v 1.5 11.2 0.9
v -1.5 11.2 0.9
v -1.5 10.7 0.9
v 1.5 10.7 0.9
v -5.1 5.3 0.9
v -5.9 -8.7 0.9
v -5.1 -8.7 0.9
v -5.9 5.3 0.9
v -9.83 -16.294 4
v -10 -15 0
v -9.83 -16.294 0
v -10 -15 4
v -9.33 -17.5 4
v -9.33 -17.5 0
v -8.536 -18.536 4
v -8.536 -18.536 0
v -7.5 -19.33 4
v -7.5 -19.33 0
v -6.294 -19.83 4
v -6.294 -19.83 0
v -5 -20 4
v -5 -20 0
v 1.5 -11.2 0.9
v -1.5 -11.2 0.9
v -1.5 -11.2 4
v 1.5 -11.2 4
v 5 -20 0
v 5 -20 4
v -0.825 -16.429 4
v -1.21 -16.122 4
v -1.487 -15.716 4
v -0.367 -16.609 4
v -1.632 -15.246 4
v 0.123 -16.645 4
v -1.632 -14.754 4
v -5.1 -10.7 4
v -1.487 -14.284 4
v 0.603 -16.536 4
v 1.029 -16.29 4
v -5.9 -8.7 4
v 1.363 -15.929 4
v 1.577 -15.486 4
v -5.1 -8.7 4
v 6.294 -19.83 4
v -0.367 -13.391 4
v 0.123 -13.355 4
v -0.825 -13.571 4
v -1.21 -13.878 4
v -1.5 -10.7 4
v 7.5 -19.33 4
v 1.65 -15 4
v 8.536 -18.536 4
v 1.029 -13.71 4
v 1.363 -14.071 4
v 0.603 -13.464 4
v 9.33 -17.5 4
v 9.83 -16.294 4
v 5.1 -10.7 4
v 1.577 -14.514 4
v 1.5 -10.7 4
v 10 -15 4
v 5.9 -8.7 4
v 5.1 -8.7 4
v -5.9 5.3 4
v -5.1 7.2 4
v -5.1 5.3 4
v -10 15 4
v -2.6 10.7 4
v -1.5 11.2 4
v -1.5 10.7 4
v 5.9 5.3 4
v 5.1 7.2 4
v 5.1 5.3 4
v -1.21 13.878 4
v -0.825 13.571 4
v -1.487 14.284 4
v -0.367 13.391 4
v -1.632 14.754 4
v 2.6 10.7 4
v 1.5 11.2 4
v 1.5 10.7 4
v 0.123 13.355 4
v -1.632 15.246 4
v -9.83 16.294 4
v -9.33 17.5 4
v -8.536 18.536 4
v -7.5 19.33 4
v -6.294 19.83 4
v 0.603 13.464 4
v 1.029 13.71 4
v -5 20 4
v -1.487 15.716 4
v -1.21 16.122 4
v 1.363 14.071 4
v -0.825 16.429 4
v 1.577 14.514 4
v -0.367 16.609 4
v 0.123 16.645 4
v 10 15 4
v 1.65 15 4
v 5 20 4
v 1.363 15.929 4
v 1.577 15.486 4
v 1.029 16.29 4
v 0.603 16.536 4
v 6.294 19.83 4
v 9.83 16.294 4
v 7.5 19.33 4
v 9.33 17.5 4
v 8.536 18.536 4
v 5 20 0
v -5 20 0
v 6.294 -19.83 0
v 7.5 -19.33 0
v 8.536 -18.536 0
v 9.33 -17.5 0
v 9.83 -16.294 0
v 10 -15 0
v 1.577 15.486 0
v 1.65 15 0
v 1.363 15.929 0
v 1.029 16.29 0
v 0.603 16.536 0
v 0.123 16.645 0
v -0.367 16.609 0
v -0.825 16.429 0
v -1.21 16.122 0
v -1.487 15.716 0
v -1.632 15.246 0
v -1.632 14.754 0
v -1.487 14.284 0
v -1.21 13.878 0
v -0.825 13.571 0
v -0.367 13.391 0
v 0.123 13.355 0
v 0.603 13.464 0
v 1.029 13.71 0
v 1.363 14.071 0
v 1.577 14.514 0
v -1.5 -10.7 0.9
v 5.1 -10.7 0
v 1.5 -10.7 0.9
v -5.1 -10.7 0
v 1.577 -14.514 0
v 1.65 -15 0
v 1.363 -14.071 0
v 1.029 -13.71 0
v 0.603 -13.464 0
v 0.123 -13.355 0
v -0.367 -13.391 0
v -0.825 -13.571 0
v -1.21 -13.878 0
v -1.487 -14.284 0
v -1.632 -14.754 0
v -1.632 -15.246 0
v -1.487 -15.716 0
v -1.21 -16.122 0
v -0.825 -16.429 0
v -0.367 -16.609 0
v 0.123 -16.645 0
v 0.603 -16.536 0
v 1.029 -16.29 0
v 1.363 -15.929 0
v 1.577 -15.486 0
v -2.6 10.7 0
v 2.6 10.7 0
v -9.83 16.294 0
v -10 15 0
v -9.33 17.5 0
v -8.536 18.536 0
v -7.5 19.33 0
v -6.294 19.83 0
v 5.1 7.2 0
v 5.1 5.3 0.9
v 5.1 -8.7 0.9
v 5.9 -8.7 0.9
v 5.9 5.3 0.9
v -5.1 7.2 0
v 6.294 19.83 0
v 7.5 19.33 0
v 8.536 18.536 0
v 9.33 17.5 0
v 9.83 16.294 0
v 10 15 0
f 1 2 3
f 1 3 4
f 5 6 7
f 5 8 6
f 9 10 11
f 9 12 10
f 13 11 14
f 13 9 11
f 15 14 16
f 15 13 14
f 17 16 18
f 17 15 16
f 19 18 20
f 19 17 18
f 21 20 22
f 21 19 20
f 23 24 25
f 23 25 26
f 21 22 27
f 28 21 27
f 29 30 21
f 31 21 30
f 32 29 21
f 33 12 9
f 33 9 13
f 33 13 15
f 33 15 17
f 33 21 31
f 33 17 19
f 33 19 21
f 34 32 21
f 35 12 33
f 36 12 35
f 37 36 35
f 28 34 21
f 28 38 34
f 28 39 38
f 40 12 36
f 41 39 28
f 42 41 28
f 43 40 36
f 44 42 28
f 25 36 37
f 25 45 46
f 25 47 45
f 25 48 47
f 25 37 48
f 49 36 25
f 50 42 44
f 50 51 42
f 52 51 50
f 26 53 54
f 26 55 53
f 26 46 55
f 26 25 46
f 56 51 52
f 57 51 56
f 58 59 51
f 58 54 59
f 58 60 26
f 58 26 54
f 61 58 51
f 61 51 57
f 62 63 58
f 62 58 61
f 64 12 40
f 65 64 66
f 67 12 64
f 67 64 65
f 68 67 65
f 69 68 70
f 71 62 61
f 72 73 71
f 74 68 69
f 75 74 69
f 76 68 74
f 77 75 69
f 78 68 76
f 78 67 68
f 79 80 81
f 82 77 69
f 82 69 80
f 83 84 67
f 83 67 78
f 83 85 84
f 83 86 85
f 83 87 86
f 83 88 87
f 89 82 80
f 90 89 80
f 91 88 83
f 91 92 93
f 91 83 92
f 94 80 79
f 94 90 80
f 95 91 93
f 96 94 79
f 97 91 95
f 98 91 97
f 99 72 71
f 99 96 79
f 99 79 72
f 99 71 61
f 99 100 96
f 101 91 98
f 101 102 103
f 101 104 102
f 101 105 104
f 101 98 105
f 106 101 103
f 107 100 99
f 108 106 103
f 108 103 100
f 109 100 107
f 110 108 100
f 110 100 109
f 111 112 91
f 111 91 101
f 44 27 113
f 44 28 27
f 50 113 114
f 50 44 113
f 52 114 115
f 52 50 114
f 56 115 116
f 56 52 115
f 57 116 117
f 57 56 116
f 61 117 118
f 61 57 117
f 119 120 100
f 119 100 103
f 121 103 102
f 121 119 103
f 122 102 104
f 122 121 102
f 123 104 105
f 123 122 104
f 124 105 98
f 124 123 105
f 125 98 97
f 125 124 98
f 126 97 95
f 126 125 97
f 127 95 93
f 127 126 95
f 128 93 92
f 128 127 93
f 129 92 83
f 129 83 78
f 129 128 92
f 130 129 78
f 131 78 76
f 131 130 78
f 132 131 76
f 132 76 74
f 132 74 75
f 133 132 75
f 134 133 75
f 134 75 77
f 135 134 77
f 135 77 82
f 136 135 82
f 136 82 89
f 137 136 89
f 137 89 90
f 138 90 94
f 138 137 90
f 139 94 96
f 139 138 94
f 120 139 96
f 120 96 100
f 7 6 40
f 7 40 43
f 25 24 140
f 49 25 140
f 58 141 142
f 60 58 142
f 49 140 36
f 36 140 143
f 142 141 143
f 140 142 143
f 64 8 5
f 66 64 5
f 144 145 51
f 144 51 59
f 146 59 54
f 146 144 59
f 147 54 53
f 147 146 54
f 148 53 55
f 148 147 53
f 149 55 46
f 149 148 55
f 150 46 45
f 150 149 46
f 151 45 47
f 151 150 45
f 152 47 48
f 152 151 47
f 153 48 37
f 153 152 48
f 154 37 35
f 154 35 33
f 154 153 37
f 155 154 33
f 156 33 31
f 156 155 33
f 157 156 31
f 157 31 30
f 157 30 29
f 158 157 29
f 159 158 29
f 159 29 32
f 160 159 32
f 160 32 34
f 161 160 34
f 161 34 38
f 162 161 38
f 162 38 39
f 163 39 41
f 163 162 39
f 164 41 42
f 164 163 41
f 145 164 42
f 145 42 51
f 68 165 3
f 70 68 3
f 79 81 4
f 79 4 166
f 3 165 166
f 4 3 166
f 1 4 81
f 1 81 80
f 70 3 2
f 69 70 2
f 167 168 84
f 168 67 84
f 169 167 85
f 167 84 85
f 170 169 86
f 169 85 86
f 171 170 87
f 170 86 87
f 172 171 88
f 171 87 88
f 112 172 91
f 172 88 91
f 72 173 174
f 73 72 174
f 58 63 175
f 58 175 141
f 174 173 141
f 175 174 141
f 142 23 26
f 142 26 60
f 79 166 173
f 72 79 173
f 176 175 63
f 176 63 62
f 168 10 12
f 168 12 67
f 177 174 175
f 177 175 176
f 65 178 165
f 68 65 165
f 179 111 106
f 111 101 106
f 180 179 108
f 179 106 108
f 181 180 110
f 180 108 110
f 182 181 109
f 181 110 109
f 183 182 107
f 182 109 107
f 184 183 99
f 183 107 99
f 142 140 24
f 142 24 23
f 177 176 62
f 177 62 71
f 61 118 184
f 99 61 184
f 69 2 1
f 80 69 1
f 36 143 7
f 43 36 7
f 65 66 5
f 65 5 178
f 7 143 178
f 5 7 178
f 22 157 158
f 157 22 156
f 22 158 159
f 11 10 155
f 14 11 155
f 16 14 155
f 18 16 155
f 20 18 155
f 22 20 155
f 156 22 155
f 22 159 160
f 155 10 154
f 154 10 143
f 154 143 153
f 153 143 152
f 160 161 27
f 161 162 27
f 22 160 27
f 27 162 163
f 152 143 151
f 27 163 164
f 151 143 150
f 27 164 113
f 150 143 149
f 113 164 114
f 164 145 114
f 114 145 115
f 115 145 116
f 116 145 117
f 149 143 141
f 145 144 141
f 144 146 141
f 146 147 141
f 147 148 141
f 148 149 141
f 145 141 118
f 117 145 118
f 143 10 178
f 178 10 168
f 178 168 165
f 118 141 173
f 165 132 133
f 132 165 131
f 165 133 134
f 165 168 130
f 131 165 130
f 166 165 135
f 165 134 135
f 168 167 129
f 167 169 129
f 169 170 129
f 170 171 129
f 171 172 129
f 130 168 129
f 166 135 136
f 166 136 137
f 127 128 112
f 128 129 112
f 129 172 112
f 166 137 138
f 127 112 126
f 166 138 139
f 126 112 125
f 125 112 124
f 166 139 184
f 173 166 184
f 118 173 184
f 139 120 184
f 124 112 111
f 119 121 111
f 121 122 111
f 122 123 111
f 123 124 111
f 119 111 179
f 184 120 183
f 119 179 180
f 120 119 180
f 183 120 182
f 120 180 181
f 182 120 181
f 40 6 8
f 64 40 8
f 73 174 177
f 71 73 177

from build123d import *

# Parameters (mm, degrees)
F0_W     = 20
F0_H     = 40
F0_R     = 1.65
F1_DEPTH = 4
F2_R     = 5
F4_W     = 0.8
F4_H     = 14
F4_W_2   = 3
F4_H_2   = 0.5
F5_DEPTH = 3.5


with BuildPart() as f1:
    # F0 (on Top) → F1 (new body)
    with BuildSketch(Plane.XY):
        Rectangle(F0_W, F0_H)
        with Locations((0, -15)):
            Circle(F0_R, mode=Mode.SUBTRACT)
        Polygon((5.1, -10.7), (-5.1, -10.7), (-5.1, 7.2), (-2.6, 10.7), (2.6, 10.7), (5.1, 7.2), align=None, mode=Mode.SUBTRACT)
        with Locations((0, 15)):
            Circle(F0_R, mode=Mode.SUBTRACT)
    extrude(amount=F1_DEPTH)

    # F2
    f2_edges = [f1.edges().sort_by_distance(p)[0] for p in [
        (-10, 20, 2),
        (-10, -20, 2),
        (10, -20, 2),
        (10, 20, 2),
    ]]
    fillet(f2_edges, radius=F2_R)

    # F4 (on offset) → F5 (cut)
    with BuildSketch(Plane.XY.offset(0.9)):
        Polygon((-5.1, -8.7), (-5.1, -10.7), (-1.5, -10.7), (1.5, -10.7), (5.1, -10.7), (5.1, -8.7), (5.1, 5.3), (5.1, 7.2), (2.6, 10.7), (1.5, 10.7), (-1.5, 10.7), (-2.6, 10.7), (-5.1, 7.2), (-5.1, 5.3), align=None)
        with Locations((-5.5, -1.7)):
            Rectangle(F4_W, F4_H)
        with Locations((0, 10.95)):
            Rectangle(F4_W_2, F4_H_2)
        with Locations((5.5, -1.7)):
            Rectangle(F4_W, F4_H)
        with Locations((0, -10.95)):
            Rectangle(F4_W_2, F4_H_2)
    extrude(amount=F5_DEPTH, mode=Mode.SUBTRACT)


solid = f1.part
